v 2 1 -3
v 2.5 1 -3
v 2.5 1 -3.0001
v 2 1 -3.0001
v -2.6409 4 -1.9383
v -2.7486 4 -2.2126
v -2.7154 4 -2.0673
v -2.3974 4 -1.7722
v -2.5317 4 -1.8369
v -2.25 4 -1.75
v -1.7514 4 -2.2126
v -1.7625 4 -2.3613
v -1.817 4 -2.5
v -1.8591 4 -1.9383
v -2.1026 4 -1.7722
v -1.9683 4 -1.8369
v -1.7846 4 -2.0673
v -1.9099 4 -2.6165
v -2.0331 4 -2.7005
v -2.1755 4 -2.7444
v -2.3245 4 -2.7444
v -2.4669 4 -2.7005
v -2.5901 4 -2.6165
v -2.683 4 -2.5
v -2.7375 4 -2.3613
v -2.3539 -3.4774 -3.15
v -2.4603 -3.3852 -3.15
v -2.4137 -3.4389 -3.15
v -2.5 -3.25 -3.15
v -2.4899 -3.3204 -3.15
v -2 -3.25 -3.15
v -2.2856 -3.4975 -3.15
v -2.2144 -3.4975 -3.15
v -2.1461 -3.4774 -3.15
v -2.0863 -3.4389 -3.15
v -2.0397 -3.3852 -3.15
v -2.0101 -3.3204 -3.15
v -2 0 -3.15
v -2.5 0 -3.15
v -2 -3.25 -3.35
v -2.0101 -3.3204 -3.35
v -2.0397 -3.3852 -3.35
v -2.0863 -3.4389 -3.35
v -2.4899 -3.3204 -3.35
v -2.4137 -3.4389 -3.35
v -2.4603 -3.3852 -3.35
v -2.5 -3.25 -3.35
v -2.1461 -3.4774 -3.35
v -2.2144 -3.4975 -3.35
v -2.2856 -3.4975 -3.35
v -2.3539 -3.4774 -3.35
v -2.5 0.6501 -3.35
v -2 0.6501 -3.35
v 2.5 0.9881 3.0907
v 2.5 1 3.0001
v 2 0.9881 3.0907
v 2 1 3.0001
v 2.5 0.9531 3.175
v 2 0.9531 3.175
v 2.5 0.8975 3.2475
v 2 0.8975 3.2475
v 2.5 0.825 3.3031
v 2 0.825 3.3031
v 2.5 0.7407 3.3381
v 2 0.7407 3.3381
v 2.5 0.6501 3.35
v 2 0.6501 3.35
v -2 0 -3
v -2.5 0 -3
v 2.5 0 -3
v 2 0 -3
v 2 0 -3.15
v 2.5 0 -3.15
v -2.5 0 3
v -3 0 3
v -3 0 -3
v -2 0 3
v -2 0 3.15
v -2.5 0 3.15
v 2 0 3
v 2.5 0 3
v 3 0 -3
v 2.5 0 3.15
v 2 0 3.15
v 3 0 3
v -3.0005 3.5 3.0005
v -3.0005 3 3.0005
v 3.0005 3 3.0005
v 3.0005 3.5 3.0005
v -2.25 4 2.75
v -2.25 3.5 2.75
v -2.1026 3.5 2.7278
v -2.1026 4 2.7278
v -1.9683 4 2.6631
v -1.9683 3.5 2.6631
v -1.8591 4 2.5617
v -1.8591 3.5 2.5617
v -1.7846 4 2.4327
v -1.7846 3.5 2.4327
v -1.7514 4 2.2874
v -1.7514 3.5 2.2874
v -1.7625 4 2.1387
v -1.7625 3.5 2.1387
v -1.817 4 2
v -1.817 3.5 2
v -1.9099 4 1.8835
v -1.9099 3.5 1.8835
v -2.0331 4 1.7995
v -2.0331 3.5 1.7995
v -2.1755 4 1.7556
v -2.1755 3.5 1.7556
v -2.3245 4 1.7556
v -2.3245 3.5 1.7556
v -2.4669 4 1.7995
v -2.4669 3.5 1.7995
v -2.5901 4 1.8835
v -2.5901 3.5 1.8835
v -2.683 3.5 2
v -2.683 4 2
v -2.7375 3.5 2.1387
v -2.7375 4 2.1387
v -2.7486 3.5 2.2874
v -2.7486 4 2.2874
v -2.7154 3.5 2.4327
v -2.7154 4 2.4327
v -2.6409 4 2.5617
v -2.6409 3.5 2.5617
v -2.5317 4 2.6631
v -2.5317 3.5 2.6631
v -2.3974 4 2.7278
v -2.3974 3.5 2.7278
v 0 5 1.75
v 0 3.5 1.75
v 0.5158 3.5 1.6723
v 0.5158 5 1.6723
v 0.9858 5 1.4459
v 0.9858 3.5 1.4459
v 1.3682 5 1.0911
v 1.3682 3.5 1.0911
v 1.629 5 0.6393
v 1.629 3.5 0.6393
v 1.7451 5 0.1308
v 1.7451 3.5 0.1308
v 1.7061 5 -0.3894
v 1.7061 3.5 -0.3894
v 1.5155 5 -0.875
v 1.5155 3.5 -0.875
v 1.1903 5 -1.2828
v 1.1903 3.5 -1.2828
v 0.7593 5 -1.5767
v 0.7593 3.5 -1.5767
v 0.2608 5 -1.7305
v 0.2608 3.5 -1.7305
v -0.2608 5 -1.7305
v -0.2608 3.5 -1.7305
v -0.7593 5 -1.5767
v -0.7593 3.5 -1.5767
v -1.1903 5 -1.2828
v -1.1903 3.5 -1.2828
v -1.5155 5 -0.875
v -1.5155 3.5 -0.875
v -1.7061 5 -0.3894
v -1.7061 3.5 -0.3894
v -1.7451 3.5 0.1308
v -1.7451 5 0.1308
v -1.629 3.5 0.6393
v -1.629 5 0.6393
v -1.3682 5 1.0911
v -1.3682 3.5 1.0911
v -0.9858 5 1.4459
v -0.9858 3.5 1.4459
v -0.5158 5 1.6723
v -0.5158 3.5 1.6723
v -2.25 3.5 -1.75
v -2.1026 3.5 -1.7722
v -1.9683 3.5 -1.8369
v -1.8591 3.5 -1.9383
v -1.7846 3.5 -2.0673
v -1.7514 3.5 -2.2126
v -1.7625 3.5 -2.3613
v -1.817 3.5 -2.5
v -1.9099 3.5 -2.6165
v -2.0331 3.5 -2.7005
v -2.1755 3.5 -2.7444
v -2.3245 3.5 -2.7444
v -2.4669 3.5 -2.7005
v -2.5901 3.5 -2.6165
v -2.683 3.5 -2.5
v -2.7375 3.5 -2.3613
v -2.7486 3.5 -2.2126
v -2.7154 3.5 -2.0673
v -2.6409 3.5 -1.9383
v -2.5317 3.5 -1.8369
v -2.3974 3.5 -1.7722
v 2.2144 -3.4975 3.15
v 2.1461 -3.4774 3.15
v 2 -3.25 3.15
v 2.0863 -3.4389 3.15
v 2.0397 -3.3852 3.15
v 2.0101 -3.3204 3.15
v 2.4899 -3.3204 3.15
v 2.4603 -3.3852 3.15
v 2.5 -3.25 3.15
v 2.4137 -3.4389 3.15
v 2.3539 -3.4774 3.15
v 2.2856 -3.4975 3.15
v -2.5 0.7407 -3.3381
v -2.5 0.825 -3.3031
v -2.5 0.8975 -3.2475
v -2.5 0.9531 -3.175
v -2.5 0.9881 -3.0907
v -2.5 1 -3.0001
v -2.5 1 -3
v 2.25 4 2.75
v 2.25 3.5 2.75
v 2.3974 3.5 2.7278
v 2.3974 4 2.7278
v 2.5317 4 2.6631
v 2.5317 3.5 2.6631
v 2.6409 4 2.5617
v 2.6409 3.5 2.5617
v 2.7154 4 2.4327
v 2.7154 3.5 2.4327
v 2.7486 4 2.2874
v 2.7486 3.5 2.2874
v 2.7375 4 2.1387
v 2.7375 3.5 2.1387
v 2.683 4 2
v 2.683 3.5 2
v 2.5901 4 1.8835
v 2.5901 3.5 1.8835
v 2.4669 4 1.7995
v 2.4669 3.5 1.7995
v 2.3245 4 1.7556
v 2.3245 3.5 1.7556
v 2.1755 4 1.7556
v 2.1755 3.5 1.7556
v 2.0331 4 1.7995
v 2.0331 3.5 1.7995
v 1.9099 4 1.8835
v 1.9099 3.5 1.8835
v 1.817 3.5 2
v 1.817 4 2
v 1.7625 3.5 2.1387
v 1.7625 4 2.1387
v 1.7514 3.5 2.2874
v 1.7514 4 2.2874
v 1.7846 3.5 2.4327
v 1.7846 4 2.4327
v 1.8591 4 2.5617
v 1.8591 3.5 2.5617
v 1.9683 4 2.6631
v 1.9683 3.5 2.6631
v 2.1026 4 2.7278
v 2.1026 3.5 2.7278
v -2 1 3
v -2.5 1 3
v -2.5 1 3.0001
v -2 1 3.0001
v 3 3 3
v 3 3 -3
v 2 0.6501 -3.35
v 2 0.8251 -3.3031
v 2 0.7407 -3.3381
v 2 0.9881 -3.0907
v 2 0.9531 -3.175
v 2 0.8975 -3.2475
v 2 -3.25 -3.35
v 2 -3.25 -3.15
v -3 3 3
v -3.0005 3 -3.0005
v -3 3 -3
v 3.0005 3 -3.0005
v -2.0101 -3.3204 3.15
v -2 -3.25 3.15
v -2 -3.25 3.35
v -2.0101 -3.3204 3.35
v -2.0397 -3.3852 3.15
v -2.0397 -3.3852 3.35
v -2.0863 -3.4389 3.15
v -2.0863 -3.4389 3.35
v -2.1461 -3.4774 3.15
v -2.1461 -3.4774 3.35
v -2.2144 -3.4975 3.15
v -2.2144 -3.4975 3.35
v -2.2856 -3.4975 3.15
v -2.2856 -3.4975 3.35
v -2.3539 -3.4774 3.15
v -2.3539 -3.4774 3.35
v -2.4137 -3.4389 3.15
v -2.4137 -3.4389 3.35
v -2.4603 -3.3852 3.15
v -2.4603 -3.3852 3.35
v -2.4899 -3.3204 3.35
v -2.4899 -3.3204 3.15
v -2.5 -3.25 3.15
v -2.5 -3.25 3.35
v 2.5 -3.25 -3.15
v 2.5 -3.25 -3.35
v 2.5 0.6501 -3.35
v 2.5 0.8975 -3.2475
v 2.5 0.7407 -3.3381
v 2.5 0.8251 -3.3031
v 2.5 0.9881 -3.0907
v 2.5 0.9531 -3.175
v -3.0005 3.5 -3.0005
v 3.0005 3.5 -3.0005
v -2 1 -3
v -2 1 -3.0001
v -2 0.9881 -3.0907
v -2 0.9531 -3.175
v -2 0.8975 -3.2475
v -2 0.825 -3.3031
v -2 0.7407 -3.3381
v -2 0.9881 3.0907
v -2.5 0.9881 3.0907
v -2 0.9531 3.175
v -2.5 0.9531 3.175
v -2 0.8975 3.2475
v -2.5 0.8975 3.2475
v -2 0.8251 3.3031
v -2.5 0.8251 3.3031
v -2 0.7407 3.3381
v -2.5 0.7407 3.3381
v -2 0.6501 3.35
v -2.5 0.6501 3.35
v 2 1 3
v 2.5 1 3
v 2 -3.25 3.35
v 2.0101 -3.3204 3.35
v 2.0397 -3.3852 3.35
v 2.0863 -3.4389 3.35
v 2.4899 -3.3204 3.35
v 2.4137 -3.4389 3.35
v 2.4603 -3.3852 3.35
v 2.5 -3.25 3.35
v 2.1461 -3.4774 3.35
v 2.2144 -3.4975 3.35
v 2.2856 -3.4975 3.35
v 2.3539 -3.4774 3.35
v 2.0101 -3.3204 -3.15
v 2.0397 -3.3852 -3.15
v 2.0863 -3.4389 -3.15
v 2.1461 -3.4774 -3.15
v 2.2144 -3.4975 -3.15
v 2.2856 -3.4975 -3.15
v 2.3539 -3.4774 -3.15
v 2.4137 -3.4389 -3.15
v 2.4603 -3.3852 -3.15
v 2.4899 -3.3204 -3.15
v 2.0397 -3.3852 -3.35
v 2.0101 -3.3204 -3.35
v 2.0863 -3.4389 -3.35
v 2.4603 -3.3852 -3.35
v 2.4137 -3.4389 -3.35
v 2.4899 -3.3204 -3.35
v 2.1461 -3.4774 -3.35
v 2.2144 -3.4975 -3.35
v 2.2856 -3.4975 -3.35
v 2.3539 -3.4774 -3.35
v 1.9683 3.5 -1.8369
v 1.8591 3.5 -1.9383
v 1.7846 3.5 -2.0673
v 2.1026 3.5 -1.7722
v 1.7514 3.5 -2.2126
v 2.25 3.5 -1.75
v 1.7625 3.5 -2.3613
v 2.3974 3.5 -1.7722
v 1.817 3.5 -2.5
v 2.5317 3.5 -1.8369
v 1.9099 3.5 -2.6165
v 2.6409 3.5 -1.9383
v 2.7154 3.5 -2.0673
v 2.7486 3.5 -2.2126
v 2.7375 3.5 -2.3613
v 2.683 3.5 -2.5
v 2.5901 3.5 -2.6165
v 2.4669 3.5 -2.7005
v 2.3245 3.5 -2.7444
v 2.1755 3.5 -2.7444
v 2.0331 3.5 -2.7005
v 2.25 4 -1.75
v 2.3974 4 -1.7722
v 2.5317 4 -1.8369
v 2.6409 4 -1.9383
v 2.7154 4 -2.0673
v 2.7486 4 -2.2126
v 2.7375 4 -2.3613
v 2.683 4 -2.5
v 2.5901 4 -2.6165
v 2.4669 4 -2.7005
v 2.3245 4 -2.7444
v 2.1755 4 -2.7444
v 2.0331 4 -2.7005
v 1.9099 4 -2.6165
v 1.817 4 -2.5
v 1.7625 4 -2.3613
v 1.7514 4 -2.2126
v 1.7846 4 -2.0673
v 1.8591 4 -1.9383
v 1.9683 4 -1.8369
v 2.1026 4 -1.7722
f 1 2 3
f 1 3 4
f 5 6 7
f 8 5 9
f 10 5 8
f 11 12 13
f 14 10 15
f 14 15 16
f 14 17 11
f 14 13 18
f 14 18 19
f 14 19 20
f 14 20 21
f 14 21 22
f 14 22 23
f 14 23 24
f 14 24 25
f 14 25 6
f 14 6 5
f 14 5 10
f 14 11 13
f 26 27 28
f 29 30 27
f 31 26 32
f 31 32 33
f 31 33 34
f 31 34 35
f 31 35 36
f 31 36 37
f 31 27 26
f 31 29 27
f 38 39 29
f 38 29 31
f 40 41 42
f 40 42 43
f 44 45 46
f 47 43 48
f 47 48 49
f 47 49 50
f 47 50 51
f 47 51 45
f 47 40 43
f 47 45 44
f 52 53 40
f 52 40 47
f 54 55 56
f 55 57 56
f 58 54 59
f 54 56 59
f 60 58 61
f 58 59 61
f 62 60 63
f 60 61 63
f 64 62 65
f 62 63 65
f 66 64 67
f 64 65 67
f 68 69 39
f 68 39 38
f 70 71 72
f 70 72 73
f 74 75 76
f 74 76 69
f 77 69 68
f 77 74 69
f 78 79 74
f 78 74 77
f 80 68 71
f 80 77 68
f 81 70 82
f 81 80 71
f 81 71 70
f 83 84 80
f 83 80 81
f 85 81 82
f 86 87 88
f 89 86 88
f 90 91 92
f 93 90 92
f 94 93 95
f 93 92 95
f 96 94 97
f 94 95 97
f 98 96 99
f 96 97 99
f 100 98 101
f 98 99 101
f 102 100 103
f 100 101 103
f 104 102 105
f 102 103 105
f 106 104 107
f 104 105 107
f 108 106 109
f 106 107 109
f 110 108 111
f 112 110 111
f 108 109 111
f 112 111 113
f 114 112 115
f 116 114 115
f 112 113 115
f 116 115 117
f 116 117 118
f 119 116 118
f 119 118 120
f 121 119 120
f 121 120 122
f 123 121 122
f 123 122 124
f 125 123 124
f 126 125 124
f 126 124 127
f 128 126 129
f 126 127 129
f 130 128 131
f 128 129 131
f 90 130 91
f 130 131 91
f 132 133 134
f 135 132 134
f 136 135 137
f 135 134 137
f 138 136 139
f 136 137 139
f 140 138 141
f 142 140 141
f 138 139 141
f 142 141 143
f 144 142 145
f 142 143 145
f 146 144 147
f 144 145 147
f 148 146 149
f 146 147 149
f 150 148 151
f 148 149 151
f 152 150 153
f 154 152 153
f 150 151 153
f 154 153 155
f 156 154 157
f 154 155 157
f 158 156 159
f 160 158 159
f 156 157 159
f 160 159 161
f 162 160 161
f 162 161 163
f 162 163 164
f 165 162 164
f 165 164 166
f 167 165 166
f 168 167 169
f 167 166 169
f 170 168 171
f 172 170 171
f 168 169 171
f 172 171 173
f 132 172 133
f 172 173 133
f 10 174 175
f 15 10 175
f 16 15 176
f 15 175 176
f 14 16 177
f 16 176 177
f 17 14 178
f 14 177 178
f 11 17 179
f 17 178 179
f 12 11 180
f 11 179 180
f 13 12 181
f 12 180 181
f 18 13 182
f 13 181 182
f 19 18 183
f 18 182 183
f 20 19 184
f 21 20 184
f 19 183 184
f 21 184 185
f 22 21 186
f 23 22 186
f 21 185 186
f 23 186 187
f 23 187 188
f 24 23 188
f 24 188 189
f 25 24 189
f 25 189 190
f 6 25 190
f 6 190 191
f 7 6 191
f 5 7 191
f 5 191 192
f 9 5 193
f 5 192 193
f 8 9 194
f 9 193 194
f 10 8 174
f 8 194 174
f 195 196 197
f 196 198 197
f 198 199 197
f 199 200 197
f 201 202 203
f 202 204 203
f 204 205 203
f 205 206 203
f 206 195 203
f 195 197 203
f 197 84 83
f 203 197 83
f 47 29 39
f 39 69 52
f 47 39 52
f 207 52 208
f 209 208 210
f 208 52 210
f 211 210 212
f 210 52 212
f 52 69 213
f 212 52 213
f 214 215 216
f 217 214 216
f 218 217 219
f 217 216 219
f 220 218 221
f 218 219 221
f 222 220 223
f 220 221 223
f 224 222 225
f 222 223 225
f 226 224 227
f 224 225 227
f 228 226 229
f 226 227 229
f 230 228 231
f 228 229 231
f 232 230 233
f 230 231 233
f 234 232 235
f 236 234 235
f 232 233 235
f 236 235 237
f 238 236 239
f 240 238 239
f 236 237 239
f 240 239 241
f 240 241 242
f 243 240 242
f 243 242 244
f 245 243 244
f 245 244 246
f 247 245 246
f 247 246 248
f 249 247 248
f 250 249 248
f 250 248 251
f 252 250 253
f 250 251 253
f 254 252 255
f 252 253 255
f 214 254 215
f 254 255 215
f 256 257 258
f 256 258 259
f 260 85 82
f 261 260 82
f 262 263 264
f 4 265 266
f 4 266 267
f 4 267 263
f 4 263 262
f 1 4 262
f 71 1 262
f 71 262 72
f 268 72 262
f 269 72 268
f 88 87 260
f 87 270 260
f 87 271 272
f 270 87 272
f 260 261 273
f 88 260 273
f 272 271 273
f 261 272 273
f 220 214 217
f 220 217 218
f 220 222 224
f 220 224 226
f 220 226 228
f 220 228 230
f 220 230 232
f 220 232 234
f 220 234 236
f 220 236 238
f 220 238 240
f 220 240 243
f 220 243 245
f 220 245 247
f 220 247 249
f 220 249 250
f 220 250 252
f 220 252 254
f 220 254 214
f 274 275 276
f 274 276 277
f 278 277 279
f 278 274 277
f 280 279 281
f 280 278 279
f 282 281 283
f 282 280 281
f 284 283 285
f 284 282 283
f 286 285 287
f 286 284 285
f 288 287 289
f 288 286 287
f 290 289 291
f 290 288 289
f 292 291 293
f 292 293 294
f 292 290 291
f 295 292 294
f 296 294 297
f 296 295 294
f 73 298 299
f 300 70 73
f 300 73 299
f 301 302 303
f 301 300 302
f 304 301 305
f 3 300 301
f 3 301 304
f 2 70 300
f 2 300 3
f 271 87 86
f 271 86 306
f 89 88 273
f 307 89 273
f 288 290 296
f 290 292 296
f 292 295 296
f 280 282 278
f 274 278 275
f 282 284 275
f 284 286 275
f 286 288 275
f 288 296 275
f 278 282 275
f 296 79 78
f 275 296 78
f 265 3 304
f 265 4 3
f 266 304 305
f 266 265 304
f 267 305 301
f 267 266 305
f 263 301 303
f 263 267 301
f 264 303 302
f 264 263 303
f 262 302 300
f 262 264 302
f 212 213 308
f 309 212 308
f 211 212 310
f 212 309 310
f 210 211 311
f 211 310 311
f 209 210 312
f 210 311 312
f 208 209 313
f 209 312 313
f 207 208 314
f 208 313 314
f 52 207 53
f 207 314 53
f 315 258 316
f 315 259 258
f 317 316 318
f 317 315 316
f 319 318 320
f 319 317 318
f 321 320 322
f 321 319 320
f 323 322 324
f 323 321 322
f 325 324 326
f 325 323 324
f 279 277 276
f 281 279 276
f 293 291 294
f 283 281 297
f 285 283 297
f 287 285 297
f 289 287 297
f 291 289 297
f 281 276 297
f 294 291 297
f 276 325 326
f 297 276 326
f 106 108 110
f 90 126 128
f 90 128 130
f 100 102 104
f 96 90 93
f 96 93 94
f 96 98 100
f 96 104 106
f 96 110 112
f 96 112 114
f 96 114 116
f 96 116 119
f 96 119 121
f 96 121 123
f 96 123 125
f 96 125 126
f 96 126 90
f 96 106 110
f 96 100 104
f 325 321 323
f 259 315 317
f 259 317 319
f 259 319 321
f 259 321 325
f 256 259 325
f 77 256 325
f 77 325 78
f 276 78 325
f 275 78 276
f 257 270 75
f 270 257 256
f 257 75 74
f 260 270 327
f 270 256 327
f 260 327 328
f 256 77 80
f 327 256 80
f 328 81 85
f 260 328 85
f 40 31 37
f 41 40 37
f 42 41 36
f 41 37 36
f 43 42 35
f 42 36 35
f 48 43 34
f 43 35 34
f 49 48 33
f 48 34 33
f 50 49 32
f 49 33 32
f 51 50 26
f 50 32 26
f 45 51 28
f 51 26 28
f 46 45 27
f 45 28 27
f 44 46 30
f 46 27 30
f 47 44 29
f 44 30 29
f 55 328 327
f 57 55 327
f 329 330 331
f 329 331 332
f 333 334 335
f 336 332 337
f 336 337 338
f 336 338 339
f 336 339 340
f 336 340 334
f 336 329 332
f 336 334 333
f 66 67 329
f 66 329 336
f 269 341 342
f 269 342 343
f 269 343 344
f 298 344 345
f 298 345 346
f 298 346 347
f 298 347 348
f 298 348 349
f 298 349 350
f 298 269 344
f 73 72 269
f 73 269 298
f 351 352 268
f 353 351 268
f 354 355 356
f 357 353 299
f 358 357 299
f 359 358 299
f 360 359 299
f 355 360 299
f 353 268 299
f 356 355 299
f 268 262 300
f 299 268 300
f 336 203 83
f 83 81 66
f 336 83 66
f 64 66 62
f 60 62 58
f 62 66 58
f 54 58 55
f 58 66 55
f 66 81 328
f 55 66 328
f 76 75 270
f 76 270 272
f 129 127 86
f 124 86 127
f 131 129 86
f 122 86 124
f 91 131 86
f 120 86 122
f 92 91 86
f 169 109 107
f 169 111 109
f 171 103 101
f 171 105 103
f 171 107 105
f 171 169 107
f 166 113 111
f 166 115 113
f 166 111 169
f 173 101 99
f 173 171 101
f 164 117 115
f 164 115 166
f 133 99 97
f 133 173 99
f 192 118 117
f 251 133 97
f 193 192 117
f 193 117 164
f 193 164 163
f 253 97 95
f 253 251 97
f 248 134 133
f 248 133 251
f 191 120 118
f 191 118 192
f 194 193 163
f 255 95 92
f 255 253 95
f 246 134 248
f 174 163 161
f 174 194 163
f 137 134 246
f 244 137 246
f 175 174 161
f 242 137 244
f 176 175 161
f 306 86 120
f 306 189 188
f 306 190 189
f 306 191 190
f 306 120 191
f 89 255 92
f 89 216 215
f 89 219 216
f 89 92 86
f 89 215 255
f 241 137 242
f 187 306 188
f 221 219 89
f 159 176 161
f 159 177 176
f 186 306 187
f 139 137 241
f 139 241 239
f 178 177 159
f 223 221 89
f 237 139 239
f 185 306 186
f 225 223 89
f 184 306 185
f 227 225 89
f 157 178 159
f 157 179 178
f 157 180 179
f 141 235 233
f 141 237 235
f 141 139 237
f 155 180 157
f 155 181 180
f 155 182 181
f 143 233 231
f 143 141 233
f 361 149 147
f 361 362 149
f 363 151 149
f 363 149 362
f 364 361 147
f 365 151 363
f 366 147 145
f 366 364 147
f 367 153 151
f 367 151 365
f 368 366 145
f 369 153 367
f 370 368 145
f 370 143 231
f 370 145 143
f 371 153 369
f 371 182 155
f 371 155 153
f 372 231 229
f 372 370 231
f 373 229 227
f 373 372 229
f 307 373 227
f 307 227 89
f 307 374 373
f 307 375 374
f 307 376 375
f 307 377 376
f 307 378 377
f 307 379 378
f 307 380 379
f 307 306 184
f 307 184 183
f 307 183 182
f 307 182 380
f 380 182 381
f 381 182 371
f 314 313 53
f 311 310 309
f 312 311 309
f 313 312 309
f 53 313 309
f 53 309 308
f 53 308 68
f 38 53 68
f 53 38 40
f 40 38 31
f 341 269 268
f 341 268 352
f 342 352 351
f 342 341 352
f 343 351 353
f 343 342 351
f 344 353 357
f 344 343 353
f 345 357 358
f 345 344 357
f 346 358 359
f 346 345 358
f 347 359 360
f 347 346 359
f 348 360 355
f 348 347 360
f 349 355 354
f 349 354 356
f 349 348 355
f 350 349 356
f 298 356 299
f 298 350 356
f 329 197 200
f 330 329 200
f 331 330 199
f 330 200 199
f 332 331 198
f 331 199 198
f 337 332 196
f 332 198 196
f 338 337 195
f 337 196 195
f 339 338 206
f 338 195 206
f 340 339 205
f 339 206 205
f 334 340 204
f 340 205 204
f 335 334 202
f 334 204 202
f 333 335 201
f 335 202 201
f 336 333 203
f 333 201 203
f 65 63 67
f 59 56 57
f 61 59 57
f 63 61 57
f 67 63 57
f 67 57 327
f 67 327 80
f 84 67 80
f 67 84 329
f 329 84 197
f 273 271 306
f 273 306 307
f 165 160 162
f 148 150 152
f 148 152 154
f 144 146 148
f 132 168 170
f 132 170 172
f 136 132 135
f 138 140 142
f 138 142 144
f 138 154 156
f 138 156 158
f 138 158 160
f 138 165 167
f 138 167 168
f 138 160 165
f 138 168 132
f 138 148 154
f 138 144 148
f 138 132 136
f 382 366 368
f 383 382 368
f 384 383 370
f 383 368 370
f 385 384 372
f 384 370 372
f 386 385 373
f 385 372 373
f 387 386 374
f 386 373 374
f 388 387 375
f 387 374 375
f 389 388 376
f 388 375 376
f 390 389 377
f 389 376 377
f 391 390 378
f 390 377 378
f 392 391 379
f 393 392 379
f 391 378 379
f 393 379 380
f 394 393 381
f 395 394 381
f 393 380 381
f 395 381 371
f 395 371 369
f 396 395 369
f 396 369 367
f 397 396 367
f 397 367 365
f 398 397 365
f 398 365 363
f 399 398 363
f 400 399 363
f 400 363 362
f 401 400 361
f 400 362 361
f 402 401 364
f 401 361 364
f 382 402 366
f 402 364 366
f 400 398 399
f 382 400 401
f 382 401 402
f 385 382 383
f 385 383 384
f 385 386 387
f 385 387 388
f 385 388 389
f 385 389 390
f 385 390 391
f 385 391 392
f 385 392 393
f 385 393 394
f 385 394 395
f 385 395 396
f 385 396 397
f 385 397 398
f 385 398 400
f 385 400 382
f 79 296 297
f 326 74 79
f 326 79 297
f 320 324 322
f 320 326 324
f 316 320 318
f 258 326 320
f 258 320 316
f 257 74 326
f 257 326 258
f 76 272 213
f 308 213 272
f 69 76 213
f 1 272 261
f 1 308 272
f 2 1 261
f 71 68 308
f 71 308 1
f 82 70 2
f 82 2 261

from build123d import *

# Parameters (mm, degrees)
CROQUIS3_W               = 6
CROQUIS3_H               = 6
SALIENTE_EXTRUIR4_DEPTH  = 3
CROQUIS6_W               = 6.001
CROQUIS6_H               = 6.001
SALIENTE_EXTRUIR9_DEPTH  = 0.5
CROQUIS7_R               = 0.5
SALIENTE_EXTRUIR10_DEPTH = 0.5
CROQUIS7_3_R             = 1.75
SALIENTE_EXTRUIR11_DEPTH = 1.5
SALIENTE_EXTRUIR12_DEPTH = 0.35
REDONDEO3_R              = 0.35
REDONDEO3_OF_SIMETR_A4_R = 0.35
CROQUIS11_W              = 6
CROQUIS11_H              = 6.3
CORTAR_EXTRUIR1_DEPTH    = 6.2


with BuildPart() as part:
    # Croquis3 → Saliente-Extruir4 (new body)
    with BuildSketch(Plane(origin=(0, 0, 0), x_dir=(1, 0, 0), z_dir=(0, 1, 0))):
        Rectangle(CROQUIS3_W, CROQUIS3_H)
    extrude(amount=SALIENTE_EXTRUIR4_DEPTH)

    # Croquis6 → Saliente-Extruir9 (add)
    with BuildSketch(Plane(origin=(0, 3, 0), x_dir=(1, 0, 0), z_dir=(0, 1, 0))):
        Rectangle(CROQUIS6_W, CROQUIS6_H)
    extrude(amount=SALIENTE_EXTRUIR9_DEPTH)

    # Croquis7 → Saliente-Extruir10 (add)
    with BuildSketch(Plane(origin=(0, 3.5, 0), x_dir=(1, 0, 0), z_dir=(0, 1, 0))):
        with Locations(Location((-2.25, -2.25, 0), (0, 0, 270))):
            Circle(CROQUIS7_R)
        with Locations(Location((-2.25, 2.25, 0), (0, 0, 270))):
            Circle(CROQUIS7_R)
        with Locations(Location((2.25, 2.25, 0), (0, 0, 270))):
            Circle(CROQUIS7_R)
        with Locations(Location((2.25, -2.25, 0), (0, 0, 270))):
            Circle(CROQUIS7_R)
    extrude(amount=SALIENTE_EXTRUIR10_DEPTH)

    # Croquis7<3> → Saliente-Extruir11 (add)
    with BuildSketch(Plane(origin=(0, 3.5, 0), x_dir=(1, 0, 0), z_dir=(0, 1, 0))):
        with Locations(Location((0, 0, 0), (0, 0, 270))):
            Circle(CROQUIS7_3_R)
    extrude(amount=SALIENTE_EXTRUIR11_DEPTH)

    # Croquis8 → Saliente-Extruir12 (add)
    with BuildSketch(Plane.XY.offset(3)):
        with BuildLine():
            Line((-2.5, 1), (-2, 1))
            Line((-2, 1), (-2, -3.25))
            ThreePointArc((-2, -3.25), (-2.25, -3.5), (-2.5, -3.25))
            Line((-2.5, -3.25), (-2.5, 1))
        make_face()
        with BuildLine():
            Line((2, 1), (2, -3.25))
            ThreePointArc((2, -3.25), (2.25, -3.5), (2.5, -3.25))
            Line((2.5, -3.25), (2.5, 1))
            Line((2.5, 1), (2, 1))
        make_face()
    saliente_extruir12 = extrude(amount=SALIENTE_EXTRUIR12_DEPTH)

    # Redondeo3
    redondeo3_edges = [part.edges().sort_by_distance(p)[0] for p in [
        (-2.25, 1, 3.35),
        (2.25, 1, 3.35),
    ]]
    fillet(redondeo3_edges, radius=REDONDEO3_R - 0.0001)  # a hair under: the kernel refuses the full size

    # Simetría4: Saliente-Extruir12 across plane
    add(saliente_extruir12.mirror(Plane.XY))

    # Redondeo3 of Simetría4
    redondeo3_of_simetr_a4_edges = [part.edges().sort_by_distance(p)[0] for p in [
        (-2.25, 1, -3.35),
        (2.25, 1, -3.35),
    ]]
    fillet(redondeo3_of_simetr_a4_edges, radius=REDONDEO3_OF_SIMETR_A4_R - 0.0001)  # a hair under: the kernel refuses the full size

    # Croquis11 → Cortar-Extruir1 (cut)
    with BuildSketch(Plane.XZ):
        Rectangle(CROQUIS11_W, CROQUIS11_H)
    extrude(amount=CORTAR_EXTRUIR1_DEPTH, mode=Mode.SUBTRACT)


solid = part.part
